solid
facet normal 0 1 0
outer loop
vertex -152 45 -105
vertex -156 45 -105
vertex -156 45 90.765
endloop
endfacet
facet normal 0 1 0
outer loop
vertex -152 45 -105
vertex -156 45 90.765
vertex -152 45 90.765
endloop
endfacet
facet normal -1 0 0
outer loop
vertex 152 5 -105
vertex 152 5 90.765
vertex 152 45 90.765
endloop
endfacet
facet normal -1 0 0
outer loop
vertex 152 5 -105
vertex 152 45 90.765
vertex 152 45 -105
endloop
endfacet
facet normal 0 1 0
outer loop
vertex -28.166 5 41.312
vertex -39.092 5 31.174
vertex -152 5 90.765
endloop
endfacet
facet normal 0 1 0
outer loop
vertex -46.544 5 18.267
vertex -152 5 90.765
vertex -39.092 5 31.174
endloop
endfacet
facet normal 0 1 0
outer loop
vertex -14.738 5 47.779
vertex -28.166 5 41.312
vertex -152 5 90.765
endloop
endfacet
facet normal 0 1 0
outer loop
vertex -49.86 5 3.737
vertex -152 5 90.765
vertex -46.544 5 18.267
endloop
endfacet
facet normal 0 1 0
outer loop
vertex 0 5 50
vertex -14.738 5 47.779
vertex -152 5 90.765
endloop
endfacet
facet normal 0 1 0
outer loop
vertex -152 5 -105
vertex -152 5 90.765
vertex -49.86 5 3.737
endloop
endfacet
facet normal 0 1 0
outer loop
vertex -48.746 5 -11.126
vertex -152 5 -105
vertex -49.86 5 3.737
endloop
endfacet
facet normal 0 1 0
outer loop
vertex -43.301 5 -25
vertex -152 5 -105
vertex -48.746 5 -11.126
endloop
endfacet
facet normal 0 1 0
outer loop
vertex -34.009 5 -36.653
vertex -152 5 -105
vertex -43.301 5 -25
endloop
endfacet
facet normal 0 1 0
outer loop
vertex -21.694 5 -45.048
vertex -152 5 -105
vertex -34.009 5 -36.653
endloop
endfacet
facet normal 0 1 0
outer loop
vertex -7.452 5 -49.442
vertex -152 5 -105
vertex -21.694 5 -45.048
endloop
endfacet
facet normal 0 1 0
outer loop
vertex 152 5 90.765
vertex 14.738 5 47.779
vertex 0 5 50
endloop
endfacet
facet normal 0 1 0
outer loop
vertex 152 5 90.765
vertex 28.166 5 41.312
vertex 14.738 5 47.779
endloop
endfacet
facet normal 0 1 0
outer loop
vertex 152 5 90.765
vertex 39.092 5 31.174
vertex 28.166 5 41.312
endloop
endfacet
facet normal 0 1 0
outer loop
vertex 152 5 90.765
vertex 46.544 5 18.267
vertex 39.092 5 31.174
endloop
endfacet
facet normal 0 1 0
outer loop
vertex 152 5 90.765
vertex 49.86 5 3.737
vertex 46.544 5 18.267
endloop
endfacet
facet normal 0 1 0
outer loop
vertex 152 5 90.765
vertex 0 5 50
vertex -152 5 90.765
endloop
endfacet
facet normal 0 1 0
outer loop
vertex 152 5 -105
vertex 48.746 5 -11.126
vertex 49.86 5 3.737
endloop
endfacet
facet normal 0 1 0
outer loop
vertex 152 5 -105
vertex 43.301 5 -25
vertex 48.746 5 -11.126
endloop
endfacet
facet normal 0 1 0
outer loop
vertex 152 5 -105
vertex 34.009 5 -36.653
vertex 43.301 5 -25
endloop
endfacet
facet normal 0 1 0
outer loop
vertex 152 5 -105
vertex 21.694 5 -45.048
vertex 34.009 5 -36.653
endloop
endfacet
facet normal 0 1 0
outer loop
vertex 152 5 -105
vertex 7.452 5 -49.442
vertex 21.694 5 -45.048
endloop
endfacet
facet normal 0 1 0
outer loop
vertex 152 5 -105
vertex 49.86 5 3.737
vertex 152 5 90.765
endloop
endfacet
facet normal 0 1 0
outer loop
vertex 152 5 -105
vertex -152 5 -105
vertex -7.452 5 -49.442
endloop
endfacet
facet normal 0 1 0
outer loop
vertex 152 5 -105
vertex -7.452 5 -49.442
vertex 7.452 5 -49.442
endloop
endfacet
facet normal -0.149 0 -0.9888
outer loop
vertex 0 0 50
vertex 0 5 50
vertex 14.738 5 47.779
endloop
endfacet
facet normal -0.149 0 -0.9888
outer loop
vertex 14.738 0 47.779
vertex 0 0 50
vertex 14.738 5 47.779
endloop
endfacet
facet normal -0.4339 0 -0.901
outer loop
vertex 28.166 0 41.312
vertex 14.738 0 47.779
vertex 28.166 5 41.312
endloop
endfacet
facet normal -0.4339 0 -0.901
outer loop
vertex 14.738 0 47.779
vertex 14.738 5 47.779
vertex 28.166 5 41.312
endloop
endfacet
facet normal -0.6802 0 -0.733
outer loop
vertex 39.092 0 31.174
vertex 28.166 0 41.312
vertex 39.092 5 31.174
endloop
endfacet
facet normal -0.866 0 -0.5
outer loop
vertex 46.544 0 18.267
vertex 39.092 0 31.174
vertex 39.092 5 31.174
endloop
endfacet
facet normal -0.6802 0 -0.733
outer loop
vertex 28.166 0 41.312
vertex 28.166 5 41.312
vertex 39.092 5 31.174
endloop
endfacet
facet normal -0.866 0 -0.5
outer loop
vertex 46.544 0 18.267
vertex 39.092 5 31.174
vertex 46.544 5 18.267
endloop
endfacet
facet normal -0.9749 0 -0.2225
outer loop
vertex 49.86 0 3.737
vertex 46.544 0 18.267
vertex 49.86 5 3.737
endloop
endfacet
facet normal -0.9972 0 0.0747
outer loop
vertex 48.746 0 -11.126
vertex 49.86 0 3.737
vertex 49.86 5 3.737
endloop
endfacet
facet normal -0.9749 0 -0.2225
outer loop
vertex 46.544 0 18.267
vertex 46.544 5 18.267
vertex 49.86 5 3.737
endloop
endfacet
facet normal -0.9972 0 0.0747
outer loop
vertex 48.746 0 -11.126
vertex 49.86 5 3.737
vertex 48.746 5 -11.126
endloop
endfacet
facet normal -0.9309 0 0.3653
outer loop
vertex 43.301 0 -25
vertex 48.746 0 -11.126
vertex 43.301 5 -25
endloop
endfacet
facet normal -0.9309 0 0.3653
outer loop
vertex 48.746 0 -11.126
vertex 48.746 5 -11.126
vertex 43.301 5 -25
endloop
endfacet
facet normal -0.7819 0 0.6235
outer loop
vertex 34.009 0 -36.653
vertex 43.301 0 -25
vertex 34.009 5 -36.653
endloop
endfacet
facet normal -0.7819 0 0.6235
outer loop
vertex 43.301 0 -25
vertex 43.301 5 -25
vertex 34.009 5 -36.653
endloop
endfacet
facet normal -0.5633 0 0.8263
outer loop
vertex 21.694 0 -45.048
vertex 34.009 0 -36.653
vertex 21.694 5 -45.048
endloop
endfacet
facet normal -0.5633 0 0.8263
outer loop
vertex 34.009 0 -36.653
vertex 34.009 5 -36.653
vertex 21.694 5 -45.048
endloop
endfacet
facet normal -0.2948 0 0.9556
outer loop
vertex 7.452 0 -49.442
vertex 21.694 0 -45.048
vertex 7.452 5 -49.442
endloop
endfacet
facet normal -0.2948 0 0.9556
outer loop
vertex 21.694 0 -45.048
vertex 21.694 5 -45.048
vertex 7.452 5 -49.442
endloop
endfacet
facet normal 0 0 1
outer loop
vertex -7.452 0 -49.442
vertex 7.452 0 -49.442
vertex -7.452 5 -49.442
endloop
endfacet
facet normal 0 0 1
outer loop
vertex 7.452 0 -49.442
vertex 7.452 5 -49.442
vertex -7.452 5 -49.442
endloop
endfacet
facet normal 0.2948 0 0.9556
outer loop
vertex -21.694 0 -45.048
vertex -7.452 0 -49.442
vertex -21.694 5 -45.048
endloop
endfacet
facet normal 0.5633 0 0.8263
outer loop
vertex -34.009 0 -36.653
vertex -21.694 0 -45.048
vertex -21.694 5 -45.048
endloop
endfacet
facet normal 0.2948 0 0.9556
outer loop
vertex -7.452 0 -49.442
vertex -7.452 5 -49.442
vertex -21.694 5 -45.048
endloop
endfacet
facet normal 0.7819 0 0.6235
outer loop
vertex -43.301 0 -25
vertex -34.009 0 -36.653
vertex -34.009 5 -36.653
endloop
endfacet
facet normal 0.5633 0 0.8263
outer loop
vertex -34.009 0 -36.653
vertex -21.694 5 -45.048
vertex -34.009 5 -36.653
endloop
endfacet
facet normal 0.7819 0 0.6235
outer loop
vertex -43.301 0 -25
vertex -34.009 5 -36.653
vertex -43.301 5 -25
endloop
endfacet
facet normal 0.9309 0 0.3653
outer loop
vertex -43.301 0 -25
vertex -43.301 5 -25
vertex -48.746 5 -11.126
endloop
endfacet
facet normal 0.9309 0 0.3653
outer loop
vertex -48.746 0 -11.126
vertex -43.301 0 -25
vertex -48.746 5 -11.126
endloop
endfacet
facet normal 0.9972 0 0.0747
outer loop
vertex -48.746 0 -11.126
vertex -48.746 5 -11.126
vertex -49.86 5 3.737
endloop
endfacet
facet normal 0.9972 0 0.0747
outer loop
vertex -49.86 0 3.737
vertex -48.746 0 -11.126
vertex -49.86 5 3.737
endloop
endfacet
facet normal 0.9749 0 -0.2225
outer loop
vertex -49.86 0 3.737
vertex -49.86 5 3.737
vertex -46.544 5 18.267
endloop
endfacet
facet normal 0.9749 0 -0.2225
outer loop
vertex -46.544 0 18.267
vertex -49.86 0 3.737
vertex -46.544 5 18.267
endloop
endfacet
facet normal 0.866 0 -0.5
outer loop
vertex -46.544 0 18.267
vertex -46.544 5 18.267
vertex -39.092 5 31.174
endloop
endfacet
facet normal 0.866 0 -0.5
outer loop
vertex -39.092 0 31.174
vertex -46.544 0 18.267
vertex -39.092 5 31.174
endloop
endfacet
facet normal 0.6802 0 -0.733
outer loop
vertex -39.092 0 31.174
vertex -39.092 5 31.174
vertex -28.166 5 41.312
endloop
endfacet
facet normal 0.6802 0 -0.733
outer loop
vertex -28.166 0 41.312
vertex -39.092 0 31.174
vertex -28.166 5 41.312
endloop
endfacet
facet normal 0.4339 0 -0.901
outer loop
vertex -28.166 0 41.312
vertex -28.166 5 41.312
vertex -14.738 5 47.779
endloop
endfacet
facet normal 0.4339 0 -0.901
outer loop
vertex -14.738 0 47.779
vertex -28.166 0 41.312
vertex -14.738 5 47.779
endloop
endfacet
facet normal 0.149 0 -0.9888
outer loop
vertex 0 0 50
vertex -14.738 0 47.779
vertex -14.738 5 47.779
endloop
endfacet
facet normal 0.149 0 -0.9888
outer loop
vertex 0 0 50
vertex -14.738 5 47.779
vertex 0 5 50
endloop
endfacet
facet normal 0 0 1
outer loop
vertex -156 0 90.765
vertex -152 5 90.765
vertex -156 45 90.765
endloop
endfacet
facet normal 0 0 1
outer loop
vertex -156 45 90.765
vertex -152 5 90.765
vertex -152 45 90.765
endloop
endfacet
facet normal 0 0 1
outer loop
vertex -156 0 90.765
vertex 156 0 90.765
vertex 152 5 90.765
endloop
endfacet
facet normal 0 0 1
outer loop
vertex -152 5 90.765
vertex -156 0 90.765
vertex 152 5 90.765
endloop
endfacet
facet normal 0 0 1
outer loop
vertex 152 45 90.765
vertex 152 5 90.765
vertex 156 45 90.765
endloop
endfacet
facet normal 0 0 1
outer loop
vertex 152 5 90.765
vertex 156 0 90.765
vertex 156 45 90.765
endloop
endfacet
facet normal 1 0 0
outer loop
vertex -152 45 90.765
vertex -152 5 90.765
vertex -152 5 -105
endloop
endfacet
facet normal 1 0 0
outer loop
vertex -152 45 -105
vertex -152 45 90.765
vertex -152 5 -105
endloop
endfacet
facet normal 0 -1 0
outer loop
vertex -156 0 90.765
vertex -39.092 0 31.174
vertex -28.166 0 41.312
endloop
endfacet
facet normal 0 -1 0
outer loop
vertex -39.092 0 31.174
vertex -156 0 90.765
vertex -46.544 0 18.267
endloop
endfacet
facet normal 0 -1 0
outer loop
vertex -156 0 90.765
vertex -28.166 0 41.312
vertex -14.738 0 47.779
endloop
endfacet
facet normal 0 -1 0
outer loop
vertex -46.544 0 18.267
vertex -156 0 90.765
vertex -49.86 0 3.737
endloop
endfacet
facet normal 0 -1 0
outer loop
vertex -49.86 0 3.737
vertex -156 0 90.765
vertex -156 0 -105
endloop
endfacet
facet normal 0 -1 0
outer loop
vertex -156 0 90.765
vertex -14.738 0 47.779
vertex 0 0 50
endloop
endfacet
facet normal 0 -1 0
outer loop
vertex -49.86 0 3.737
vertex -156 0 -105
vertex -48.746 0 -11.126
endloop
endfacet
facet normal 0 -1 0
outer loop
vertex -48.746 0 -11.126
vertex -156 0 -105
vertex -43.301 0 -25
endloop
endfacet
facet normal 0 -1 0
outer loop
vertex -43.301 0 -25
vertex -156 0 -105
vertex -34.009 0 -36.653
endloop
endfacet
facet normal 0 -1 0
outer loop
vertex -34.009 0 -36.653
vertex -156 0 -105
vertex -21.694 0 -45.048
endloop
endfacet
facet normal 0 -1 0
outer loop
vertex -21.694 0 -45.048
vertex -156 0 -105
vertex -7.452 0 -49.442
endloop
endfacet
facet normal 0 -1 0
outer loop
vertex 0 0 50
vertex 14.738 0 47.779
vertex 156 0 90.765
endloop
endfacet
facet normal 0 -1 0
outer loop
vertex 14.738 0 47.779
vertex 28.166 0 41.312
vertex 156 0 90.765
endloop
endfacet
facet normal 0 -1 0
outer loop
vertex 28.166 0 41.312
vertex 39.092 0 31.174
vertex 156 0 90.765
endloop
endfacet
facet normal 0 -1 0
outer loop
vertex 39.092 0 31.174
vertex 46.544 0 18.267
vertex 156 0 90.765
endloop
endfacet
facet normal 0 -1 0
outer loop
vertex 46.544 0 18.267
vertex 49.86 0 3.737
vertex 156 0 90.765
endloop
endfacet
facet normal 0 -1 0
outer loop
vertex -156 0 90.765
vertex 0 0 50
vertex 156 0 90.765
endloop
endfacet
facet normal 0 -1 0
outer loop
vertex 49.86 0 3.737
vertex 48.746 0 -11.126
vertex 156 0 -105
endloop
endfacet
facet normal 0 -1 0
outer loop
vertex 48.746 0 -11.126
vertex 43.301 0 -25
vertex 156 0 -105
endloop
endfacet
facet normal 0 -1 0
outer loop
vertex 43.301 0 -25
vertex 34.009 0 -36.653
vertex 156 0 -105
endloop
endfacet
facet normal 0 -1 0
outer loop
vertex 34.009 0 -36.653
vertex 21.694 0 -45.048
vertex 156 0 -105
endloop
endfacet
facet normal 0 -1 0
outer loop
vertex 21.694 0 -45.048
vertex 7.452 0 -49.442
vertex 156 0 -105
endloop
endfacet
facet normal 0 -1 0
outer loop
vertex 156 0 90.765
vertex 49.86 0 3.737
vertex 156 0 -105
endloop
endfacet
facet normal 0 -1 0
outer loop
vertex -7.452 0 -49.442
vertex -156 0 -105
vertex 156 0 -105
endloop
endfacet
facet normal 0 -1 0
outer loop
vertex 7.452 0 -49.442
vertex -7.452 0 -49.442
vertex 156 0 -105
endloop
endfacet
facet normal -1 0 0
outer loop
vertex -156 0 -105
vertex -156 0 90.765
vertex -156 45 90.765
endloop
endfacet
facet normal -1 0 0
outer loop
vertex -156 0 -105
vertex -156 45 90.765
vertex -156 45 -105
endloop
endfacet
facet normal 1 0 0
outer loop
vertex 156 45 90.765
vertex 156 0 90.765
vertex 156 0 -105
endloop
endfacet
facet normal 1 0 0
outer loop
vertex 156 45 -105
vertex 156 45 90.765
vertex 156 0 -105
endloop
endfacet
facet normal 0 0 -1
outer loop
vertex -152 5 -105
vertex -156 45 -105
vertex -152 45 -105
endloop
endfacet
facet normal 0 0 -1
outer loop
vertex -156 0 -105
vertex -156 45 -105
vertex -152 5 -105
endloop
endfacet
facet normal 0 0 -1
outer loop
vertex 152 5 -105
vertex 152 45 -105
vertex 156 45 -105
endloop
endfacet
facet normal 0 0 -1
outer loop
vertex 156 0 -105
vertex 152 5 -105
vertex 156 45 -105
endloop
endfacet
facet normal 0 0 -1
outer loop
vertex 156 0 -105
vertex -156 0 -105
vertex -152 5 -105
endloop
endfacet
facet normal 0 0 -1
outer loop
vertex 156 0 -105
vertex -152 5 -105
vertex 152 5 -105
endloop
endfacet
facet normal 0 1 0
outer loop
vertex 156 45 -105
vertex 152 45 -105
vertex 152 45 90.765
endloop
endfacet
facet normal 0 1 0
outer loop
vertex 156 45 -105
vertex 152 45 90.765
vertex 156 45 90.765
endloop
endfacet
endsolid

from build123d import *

# Parameters (mm, degrees)
SKETCH1_W               = 312
SKETCH1_H               = 230
BOSS_EXTRUDE1_DEPTH     = 5
SKETCH2_W               = 4
SKETCH2_H               = 230
BOSS_EXTRUDE2_DEPTH     = 40
SKETCH3_R               = 50
CUT_EXTRUDE1_DEPTH      = 198.89138435
CUT_EXTRUDE2_DEPTH      = 198.89138435
CUT_EXTRUDE2_DEPTH_BACK = 198.89138435
SKETCH4_W               = 312
SKETCH4_H               = 10
SKETCH5_W               = 24.234530733
SKETCH5_H               = 45
CUT_EXTRUDE3_DEPTH      = 336.550294293


with BuildPart() as part:
    # Sketch1 → Boss-Extrude1 (new body)
    with BuildSketch(Plane(origin=(0, 0, 0), x_dir=(1, 0, 0), z_dir=(0, 1, 0))):
        Rectangle(SKETCH1_W, SKETCH1_H)
    extrude(amount=BOSS_EXTRUDE1_DEPTH)

    # Sketch2 → Boss-Extrude2 (add)
    with BuildSketch(Plane(origin=(0, 5, 0), x_dir=(1, 0, 0), z_dir=(0, 1, 0))):
        with Locations((-154, 0)):
            Rectangle(SKETCH2_W, SKETCH2_H)
        with Locations((154, 0)):
            Rectangle(SKETCH2_W, SKETCH2_H)
    extrude(amount=BOSS_EXTRUDE2_DEPTH)

    # Sketch3 → Cut-Extrude1 (cut, through all)
    with BuildSketch(Plane(origin=(0, 5, 0), x_dir=(1, 0, 0), z_dir=(0, 1, 0))):
        with Locations(Location((0, 0, 0), (0, 0, 270))):
            Circle(SKETCH3_R)
    extrude(amount=-CUT_EXTRUDE1_DEPTH, mode=Mode.SUBTRACT)

    # Sketch4 → Cut-Extrude2 (cut, two sides: drawn at the far end of the back side and taken through both)
    with BuildSketch(Plane(origin=(0, 5, 0), x_dir=(1, 0, 0), z_dir=(0, 1, 0)).offset(-CUT_EXTRUDE2_DEPTH_BACK)):
        with Locations((0, 110)):
            Rectangle(SKETCH4_W, SKETCH4_H)
    extrude(amount=CUT_EXTRUDE2_DEPTH + CUT_EXTRUDE2_DEPTH_BACK, mode=Mode.SUBTRACT)

    # Sketch5 → Cut-Extrude3 (cut, through all)
    with BuildSketch(Plane(origin=(156, 0, 0), x_dir=(0, 0, -1), z_dir=(1, 0, 0))):
        with Locations((-102.882734634, 22.5)):
            Rectangle(SKETCH5_W, SKETCH5_H)
    extrude(amount=-CUT_EXTRUDE3_DEPTH, mode=Mode.SUBTRACT)


solid = part.part
